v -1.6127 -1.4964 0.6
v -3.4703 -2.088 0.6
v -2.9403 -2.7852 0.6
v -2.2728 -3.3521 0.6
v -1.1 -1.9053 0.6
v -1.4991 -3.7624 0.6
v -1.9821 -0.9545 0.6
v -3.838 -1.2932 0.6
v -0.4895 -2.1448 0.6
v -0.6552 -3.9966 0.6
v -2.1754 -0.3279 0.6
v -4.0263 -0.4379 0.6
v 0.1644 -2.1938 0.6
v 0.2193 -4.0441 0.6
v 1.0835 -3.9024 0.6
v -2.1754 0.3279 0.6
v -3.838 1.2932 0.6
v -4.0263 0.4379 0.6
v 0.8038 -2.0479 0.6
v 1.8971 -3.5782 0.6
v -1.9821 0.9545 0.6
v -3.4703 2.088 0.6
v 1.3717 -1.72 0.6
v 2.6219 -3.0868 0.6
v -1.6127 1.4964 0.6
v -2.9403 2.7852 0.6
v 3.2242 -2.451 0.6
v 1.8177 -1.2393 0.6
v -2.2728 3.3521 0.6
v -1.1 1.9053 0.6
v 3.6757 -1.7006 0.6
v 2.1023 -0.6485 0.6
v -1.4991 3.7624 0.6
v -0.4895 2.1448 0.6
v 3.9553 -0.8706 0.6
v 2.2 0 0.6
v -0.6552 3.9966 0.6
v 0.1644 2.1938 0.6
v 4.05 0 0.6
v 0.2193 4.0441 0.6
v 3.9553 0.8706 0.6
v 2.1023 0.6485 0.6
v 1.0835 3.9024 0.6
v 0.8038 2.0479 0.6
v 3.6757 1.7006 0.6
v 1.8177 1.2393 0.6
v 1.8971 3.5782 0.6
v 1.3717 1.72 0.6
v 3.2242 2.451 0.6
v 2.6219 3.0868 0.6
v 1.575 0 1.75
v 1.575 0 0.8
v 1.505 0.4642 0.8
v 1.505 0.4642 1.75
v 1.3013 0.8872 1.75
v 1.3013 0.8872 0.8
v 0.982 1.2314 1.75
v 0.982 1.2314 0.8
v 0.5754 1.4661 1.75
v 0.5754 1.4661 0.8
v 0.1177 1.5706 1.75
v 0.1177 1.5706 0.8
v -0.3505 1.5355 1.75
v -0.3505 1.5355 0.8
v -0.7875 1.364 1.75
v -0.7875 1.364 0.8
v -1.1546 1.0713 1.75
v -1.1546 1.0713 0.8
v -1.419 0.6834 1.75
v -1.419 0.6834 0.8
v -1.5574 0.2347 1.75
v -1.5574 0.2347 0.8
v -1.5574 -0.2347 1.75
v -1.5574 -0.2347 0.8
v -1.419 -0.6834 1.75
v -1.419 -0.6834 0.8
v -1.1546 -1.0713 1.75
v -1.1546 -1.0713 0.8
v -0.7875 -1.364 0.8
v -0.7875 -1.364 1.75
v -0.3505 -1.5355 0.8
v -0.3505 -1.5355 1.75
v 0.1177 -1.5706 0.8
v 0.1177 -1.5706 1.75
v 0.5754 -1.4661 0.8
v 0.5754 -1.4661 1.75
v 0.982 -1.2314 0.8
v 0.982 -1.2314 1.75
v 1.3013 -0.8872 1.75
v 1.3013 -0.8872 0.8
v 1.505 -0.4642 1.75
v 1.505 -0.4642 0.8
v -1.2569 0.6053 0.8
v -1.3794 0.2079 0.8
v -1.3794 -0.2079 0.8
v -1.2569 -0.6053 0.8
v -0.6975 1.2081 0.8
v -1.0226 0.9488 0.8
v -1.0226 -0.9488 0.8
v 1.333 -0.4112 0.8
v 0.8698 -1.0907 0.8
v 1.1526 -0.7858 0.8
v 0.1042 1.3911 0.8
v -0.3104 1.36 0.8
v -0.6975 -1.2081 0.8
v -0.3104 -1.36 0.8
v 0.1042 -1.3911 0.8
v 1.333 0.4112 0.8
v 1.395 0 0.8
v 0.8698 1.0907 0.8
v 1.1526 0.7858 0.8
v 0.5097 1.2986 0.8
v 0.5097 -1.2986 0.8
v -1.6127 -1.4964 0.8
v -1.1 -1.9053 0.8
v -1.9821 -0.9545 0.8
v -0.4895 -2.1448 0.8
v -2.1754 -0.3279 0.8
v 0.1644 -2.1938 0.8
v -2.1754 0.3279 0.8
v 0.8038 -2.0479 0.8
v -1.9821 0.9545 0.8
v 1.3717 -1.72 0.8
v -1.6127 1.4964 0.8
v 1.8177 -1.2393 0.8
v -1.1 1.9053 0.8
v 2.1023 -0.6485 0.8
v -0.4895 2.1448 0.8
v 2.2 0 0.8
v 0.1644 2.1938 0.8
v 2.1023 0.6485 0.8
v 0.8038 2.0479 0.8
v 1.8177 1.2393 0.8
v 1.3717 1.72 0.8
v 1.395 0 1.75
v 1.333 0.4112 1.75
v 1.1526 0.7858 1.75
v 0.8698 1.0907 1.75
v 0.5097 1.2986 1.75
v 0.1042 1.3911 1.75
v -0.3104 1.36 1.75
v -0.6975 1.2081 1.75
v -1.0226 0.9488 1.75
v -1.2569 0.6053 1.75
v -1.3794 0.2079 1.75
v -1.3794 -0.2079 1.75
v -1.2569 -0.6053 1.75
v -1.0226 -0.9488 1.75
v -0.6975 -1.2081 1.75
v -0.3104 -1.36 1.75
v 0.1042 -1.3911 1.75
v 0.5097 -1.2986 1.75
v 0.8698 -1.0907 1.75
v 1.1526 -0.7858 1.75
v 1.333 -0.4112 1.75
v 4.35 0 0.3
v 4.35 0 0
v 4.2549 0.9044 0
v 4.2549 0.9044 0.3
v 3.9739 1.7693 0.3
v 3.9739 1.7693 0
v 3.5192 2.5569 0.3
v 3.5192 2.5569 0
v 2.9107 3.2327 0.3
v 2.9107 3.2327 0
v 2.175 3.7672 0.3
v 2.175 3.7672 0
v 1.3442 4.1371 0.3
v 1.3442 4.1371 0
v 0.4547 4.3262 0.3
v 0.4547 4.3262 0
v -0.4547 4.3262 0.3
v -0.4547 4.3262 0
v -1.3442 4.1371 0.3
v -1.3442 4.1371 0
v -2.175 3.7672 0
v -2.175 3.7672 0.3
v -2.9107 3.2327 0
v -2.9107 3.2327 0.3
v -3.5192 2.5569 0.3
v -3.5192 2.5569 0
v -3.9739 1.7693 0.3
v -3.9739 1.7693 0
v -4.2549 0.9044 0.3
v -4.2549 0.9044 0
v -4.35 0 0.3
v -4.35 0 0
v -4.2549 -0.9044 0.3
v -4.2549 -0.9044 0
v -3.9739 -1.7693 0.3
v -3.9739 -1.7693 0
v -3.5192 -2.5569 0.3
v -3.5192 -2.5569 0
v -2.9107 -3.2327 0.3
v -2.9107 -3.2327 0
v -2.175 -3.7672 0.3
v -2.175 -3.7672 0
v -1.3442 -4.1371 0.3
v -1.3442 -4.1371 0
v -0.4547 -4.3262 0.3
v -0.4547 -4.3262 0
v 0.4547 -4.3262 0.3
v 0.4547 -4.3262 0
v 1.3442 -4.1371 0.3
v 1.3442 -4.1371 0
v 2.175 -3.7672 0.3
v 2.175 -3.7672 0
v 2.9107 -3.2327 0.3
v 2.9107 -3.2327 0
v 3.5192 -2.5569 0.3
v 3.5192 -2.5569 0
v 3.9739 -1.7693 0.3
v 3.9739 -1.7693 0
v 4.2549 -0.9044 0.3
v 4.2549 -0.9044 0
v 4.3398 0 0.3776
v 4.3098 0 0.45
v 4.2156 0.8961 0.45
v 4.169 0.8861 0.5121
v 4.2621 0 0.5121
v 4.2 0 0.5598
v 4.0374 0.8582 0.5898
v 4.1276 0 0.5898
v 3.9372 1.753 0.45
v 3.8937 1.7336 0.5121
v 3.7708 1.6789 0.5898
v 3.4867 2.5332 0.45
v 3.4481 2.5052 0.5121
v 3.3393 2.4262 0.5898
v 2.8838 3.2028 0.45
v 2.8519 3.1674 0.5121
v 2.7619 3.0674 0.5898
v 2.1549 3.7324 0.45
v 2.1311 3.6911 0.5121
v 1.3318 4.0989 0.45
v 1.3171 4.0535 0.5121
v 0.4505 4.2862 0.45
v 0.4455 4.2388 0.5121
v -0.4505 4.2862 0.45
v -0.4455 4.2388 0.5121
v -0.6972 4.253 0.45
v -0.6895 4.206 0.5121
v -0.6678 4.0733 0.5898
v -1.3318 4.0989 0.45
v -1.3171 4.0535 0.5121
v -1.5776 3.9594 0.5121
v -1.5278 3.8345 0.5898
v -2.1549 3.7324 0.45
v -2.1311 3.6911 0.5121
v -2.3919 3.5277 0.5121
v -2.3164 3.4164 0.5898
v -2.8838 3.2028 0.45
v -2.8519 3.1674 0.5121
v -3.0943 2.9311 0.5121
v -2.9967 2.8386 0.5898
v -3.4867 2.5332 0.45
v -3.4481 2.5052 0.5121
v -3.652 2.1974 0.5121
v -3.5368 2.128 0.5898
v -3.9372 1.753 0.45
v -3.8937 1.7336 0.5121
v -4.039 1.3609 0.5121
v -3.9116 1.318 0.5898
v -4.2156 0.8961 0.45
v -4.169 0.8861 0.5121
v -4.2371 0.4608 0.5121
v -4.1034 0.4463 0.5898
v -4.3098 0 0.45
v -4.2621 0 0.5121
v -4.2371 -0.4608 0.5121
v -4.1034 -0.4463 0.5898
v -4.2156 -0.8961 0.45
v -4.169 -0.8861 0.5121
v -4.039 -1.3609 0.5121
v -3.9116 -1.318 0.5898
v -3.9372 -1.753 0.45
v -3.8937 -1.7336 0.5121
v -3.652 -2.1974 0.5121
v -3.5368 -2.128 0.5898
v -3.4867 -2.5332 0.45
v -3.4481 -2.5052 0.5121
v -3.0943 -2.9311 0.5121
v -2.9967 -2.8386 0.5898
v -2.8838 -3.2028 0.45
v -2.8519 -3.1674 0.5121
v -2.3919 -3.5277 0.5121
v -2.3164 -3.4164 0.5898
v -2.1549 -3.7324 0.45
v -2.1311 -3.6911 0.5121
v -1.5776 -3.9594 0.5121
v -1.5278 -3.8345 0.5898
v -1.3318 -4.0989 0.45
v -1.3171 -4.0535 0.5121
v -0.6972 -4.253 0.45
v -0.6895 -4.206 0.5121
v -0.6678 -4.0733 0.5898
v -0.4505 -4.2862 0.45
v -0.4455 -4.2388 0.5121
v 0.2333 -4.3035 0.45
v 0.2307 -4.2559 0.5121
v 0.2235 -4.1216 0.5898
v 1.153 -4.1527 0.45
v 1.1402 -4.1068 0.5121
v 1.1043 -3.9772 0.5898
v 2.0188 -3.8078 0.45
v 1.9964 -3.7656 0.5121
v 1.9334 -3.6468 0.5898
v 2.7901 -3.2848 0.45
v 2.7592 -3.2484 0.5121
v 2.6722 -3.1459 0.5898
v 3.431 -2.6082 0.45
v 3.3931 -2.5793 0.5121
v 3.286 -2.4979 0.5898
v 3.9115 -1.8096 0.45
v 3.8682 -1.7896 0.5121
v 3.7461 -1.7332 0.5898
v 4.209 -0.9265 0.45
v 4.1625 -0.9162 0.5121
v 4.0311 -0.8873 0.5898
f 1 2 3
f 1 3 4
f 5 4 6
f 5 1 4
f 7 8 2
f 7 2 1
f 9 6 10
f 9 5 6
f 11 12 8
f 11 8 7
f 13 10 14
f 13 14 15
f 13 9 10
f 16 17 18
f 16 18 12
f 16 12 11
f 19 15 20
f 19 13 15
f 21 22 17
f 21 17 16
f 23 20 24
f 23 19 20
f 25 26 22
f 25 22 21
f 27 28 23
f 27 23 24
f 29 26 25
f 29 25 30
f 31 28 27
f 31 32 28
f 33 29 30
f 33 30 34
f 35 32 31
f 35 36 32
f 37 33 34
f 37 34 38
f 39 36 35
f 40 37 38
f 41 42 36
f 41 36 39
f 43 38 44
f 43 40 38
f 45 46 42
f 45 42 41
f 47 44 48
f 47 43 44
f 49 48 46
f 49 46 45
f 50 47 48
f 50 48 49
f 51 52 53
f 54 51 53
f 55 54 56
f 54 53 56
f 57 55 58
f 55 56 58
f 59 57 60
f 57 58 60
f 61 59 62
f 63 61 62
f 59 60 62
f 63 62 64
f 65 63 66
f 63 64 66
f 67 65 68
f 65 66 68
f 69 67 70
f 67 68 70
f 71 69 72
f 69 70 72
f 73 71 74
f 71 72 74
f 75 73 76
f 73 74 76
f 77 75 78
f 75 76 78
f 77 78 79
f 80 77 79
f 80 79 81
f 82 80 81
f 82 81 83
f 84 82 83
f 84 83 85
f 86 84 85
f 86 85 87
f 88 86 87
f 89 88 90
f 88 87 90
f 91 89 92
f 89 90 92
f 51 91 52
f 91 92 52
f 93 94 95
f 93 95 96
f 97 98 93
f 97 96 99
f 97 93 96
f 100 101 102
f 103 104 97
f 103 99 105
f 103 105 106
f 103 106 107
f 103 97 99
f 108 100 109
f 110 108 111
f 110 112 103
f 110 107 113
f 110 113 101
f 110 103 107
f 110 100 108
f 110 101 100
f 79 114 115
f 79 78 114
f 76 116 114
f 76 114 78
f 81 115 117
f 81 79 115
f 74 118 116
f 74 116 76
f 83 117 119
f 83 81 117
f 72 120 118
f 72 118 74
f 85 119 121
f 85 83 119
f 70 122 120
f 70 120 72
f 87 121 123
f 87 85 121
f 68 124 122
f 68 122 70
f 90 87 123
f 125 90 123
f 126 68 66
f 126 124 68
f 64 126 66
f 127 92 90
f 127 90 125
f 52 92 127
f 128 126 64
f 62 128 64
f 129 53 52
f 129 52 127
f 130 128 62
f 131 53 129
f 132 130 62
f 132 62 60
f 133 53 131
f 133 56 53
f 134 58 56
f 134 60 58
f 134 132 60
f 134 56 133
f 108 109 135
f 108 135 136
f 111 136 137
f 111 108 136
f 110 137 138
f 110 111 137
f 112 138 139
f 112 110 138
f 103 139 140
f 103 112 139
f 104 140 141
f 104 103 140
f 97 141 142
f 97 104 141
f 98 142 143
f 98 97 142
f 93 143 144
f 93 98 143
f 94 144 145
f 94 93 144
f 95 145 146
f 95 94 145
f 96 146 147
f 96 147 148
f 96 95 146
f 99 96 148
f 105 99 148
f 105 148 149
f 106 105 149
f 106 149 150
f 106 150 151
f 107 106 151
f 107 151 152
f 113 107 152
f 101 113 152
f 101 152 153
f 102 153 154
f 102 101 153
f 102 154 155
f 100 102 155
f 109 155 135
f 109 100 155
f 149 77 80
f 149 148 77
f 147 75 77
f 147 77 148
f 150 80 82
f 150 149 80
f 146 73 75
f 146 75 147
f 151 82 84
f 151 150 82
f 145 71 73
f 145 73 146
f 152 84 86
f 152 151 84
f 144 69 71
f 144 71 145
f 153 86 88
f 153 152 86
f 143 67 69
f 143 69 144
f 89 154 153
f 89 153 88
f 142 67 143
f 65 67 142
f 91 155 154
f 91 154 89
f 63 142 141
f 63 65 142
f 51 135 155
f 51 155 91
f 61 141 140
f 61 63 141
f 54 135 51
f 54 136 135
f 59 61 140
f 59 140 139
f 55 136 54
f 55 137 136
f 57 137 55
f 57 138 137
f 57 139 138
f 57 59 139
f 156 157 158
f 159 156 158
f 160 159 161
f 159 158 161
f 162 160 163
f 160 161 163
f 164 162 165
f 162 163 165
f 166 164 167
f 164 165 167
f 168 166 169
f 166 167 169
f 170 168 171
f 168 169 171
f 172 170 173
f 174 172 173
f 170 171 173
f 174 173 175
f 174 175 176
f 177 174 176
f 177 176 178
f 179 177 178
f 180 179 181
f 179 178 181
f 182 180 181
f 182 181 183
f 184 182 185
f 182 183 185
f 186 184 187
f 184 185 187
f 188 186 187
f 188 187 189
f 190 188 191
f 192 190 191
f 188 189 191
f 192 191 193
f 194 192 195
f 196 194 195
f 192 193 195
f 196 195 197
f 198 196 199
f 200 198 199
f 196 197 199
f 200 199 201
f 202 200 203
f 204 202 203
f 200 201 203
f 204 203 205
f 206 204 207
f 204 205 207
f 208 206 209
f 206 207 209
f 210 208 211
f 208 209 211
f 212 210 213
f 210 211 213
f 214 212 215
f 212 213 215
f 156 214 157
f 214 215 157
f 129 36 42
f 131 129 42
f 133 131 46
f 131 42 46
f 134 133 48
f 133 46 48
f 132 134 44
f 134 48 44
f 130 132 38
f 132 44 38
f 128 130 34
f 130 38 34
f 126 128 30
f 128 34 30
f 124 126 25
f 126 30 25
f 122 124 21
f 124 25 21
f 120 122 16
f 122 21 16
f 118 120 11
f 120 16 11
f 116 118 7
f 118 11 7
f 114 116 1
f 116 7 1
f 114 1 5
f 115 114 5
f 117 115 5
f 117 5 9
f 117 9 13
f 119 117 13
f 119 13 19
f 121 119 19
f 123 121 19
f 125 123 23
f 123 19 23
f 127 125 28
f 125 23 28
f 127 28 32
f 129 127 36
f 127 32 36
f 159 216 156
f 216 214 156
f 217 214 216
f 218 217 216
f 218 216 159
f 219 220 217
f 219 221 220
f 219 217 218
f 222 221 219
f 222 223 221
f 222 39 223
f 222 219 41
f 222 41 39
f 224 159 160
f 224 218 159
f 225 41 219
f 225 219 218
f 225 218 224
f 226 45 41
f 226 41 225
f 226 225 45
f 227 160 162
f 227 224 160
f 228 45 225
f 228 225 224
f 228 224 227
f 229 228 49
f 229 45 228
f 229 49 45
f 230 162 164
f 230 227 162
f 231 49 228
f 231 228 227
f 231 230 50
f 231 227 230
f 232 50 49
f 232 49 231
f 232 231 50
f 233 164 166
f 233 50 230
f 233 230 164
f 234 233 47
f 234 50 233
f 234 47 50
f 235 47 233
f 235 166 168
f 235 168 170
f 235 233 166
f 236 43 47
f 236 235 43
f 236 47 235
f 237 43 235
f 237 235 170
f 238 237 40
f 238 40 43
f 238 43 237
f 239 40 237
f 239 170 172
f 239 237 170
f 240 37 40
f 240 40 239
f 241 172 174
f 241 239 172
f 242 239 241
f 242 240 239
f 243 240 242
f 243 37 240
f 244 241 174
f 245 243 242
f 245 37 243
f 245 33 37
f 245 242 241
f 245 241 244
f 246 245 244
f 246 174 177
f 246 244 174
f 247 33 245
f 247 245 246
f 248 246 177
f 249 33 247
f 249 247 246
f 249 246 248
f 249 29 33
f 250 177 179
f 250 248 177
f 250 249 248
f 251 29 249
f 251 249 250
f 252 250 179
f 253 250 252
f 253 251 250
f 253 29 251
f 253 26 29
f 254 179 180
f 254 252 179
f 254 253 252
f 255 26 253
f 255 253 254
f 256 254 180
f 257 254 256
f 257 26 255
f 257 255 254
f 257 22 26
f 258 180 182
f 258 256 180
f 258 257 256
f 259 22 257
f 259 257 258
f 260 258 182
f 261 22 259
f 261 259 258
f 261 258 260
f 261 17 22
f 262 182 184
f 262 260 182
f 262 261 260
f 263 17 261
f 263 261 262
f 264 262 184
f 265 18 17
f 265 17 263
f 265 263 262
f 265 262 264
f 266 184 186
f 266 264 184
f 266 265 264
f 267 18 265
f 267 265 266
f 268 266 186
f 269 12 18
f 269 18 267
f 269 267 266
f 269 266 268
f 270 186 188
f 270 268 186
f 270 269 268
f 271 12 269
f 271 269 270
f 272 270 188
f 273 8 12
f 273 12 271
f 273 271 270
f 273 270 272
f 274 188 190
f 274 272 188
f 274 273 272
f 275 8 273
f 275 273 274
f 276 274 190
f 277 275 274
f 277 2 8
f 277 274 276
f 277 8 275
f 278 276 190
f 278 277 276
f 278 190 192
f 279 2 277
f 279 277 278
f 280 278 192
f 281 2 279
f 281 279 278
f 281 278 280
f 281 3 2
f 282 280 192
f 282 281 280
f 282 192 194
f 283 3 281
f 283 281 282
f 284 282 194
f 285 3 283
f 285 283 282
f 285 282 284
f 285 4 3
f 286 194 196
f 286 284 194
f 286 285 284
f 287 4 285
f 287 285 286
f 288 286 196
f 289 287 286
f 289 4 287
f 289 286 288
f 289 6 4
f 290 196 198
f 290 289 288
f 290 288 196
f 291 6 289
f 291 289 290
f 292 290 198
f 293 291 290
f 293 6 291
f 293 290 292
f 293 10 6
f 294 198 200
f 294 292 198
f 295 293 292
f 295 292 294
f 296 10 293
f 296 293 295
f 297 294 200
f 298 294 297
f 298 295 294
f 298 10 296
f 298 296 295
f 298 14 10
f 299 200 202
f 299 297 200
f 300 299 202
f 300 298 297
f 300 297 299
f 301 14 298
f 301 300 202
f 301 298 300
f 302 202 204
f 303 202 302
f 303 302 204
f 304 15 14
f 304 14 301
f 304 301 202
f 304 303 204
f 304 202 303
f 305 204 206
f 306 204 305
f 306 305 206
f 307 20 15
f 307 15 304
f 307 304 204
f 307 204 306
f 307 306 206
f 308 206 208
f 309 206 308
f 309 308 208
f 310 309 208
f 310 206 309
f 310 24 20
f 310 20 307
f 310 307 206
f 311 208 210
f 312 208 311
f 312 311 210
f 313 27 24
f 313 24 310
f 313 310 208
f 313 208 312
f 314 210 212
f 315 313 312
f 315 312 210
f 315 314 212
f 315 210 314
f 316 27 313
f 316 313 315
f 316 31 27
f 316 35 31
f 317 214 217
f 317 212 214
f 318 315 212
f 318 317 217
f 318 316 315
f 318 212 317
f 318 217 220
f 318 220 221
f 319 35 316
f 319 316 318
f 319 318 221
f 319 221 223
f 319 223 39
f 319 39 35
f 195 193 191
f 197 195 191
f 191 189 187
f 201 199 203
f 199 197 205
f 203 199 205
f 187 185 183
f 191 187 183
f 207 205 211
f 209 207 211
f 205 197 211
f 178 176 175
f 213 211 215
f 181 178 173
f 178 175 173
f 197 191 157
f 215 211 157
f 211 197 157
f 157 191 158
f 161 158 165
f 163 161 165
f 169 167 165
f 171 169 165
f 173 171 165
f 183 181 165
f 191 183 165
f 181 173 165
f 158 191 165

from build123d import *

# Parameters (mm, degrees)
F0_R     = 4.35
F1_DEPTH = 0.6
F2_R     = 2.2
F3_DEPTH = 0.2
F4_R     = 1.575
F4_R_2   = 1.395
F5_DEPTH = 0.95
F6_R     = 0.3


with BuildPart() as f1:
    # F0 (on Top) → F1 (new body)
    with BuildSketch(Plane.XY):
        Circle(F0_R)
    extrude(amount=F1_DEPTH)

    # F2 (on face) → F3 (join)
    with BuildSketch(Plane.XY.offset(0.6)):
        Circle(F2_R)
    extrude(amount=F3_DEPTH)

    # F4 (on face) → F5 (join)
    with BuildSketch(Plane.XY.offset(0.8)):
        Circle(F4_R)
        Circle(F4_R_2, mode=Mode.SUBTRACT)
    extrude(amount=F5_DEPTH)

    # F6
    f6_edges = [f1.edges().sort_by_distance(p)[0] for p in [
        (-4.35, 0, 0.6),
    ]]
    fillet(f6_edges, radius=F6_R)


solid = f1.part
